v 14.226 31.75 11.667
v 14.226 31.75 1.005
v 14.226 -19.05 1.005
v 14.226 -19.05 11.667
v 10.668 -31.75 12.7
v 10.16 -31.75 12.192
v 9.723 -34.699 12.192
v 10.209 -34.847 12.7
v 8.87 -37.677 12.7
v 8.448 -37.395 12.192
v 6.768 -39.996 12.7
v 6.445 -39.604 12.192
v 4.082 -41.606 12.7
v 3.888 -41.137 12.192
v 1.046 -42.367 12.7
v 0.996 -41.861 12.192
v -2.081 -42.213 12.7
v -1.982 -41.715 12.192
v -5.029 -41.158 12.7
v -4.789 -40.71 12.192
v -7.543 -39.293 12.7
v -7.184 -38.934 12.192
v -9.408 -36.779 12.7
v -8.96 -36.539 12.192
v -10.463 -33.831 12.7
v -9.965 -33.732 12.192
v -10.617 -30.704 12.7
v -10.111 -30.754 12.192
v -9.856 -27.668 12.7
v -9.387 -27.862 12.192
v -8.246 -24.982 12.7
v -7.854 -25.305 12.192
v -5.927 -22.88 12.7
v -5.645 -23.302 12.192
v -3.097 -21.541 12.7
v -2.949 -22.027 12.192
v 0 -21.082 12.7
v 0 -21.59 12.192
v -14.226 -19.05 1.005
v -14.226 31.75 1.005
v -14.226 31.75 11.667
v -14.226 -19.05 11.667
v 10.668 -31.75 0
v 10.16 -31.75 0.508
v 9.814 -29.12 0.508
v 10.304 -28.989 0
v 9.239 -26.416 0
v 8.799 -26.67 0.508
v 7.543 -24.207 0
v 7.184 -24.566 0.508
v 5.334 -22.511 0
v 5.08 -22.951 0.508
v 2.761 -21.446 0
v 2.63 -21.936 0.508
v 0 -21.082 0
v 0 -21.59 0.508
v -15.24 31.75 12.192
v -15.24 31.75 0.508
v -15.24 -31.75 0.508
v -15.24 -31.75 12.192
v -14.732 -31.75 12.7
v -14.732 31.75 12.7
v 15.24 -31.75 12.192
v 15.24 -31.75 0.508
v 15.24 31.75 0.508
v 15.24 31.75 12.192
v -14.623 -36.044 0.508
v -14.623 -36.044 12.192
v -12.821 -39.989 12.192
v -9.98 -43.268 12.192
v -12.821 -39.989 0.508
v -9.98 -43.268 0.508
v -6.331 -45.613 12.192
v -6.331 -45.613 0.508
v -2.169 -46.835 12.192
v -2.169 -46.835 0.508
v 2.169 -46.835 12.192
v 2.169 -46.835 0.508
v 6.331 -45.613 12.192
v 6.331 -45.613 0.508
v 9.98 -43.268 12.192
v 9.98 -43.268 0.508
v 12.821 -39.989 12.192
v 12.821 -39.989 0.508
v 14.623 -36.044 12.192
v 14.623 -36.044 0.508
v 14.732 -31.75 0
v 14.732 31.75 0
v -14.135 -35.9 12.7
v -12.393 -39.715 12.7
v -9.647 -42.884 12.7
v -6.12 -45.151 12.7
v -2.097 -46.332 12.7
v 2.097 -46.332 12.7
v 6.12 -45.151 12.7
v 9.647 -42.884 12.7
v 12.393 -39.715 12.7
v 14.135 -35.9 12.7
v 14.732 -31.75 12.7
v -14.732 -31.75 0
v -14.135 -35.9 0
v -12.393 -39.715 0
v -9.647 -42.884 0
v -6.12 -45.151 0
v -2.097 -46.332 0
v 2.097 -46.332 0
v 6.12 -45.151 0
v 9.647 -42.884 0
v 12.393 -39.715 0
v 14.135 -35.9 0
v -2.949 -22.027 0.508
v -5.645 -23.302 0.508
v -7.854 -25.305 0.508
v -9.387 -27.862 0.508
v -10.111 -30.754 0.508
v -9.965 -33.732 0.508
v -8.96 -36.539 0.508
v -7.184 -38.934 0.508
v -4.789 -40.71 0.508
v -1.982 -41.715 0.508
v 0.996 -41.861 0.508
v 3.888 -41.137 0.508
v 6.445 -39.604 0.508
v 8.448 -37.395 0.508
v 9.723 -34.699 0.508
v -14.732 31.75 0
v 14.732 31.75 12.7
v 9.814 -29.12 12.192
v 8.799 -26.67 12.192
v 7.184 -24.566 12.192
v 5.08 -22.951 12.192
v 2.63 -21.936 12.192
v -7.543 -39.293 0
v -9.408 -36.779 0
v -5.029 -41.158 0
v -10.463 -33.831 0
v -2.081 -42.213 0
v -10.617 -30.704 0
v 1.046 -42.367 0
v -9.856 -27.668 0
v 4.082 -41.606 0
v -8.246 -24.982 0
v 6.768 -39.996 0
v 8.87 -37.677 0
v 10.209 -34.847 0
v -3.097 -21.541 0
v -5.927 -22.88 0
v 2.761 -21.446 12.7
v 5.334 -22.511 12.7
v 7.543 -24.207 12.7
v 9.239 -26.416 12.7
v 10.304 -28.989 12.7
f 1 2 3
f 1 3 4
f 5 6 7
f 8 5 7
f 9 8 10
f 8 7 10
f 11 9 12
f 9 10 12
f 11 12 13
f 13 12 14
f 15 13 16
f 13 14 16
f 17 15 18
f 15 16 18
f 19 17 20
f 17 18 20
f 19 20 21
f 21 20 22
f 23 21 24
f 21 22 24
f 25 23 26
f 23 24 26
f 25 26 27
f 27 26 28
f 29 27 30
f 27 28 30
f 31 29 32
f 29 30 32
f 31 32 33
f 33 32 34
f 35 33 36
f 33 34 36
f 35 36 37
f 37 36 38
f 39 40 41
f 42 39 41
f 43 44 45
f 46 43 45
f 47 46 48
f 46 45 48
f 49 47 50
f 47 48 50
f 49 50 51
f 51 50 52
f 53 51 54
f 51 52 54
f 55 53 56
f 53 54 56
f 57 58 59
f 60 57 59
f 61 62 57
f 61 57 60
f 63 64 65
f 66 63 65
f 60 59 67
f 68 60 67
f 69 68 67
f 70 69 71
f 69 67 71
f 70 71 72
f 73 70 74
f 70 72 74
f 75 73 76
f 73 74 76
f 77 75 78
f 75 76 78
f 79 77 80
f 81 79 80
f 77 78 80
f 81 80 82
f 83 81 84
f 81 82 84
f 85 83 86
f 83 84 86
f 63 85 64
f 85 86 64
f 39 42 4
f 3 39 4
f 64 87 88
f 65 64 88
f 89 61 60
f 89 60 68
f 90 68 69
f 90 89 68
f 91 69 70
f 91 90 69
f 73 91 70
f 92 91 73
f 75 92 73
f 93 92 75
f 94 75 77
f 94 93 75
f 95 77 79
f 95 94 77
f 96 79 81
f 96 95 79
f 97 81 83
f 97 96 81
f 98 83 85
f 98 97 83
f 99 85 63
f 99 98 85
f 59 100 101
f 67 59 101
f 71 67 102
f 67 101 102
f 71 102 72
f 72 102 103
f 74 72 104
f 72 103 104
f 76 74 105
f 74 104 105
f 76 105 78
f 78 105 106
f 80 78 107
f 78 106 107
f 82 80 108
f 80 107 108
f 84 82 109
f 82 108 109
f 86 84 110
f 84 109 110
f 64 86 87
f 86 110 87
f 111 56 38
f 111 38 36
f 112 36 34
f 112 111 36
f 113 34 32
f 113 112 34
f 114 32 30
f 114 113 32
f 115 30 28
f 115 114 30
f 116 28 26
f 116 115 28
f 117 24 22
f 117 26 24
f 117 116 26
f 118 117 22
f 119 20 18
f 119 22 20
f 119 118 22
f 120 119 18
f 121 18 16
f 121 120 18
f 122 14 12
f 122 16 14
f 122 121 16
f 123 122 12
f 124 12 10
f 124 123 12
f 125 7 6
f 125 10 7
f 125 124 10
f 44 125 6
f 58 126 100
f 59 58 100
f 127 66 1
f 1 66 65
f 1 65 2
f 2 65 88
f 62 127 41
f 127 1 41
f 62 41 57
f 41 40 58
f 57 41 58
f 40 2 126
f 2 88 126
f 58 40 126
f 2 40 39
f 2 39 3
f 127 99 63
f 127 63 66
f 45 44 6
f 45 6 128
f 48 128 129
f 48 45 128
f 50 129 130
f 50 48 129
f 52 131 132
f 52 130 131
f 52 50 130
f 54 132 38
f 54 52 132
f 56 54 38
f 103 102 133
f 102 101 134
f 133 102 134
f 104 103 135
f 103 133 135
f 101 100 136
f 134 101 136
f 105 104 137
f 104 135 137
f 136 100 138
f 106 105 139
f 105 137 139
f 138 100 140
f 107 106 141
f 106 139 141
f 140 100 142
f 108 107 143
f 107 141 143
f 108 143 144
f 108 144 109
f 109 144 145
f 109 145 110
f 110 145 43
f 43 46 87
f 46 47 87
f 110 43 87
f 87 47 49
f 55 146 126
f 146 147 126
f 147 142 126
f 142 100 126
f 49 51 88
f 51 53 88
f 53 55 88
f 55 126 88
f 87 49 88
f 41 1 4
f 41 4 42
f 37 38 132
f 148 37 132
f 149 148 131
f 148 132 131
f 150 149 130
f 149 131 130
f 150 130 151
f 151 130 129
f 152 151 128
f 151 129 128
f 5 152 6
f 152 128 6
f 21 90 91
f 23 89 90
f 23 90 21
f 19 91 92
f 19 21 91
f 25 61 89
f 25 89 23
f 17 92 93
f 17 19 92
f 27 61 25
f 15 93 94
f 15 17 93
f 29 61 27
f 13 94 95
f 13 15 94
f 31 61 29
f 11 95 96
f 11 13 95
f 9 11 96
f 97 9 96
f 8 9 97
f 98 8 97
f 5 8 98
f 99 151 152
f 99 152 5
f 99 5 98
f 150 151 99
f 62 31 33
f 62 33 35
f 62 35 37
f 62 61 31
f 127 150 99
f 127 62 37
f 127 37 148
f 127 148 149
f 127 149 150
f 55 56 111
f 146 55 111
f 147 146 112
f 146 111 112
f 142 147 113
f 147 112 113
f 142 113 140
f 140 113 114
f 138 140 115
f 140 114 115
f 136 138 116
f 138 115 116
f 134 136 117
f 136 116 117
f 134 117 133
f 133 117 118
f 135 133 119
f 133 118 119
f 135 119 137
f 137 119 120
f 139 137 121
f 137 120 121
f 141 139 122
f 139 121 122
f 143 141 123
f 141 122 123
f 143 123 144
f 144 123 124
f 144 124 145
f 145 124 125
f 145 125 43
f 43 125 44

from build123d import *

# Parameters (mm, degrees)
F1_DEPTH = 12.7
F3_DEPTH = 25.4
F4_SIZE  = 0.508
F6_W     = 14.2258834094
F6_H     = 10.6622967869
F7_DEPTH = 50.8


with BuildPart() as f1:
    # F0 (on Top) → F1 (new body)
    with BuildSketch(Plane.XY):
        with BuildLine():
            Line((15.24, -31.75), (15.24, 31.75))
            Line((15.24, 31.75), (-15.24, 31.75))
            Line((-15.24, 31.75), (-15.24, -31.75))
            ThreePointArc((-15.24, -31.75), (-10.7763073453, -20.9736926547), (0, -16.51))
            ThreePointArc((0, -16.51), (10.7763073453, -20.9736926547), (15.24, -31.75))
        make_face()
        with BuildLine():
            ThreePointArc((-15.24, -31.75), (0, -46.99), (15.24, -31.75))
            Line((15.24, -31.75), (0, -31.75))
            Line((0, -31.75), (-15.24, -31.75))
        make_face()
        with BuildLine():
            Line((0, -31.75), (15.24, -31.75))
            ThreePointArc((15.24, -31.75), (10.7763073453, -20.9736926547), (0, -16.51))
            Line((0, -16.51), (0, -31.75))
        make_face()
        with BuildLine():
            ThreePointArc((0, -16.51), (-10.7763073453, -20.9736926547), (-15.24, -31.75))
            Line((-15.24, -31.75), (0, -31.75))
            Line((0, -31.75), (0, -16.51))
        make_face()
    extrude(amount=F1_DEPTH)

    # F2 (on Top) → F3 (cut)
    with BuildSketch(Plane.XY):
        with BuildLine():
            ThreePointArc((10.16, -31.75), (7.1842048969, -24.5657951031), (0, -21.59))
            Line((0, -21.59), (0, -31.75))
            Line((0, -31.75), (10.16, -31.75))
        make_face()
        with BuildLine():
            Line((0, -31.75), (0, -21.59))
            ThreePointArc((0, -21.59), (-7.1842048969, -38.9342048969), (10.16, -31.75))
            Line((10.16, -31.75), (0, -31.75))
        make_face()
    extrude(amount=F3_DEPTH, mode=Mode.SUBTRACT)

    # F4
    f4_edges = [f1.edges().sort_by_distance(p)[0] for p in [
        (-15.24, 0, 12.7),
        (-15.24, 0, 0),
        (0, -41.91, 12.7),
        (0, -41.91, 0),
    ]]
    chamfer(f4_edges, length=F4_SIZE)

    # F6 (on offset) → F7 (cut)
    with BuildSketch(Plane.XZ.offset(-31.75)):
        with Locations((7.1129417047, 6.336113438)):
            Rectangle(F6_W, F6_H)
        with Locations((-7.1129417047, 6.336113438)):
            Rectangle(F6_W, F6_H)
    extrude(amount=F7_DEPTH, mode=Mode.SUBTRACT)


solid = f1.part
